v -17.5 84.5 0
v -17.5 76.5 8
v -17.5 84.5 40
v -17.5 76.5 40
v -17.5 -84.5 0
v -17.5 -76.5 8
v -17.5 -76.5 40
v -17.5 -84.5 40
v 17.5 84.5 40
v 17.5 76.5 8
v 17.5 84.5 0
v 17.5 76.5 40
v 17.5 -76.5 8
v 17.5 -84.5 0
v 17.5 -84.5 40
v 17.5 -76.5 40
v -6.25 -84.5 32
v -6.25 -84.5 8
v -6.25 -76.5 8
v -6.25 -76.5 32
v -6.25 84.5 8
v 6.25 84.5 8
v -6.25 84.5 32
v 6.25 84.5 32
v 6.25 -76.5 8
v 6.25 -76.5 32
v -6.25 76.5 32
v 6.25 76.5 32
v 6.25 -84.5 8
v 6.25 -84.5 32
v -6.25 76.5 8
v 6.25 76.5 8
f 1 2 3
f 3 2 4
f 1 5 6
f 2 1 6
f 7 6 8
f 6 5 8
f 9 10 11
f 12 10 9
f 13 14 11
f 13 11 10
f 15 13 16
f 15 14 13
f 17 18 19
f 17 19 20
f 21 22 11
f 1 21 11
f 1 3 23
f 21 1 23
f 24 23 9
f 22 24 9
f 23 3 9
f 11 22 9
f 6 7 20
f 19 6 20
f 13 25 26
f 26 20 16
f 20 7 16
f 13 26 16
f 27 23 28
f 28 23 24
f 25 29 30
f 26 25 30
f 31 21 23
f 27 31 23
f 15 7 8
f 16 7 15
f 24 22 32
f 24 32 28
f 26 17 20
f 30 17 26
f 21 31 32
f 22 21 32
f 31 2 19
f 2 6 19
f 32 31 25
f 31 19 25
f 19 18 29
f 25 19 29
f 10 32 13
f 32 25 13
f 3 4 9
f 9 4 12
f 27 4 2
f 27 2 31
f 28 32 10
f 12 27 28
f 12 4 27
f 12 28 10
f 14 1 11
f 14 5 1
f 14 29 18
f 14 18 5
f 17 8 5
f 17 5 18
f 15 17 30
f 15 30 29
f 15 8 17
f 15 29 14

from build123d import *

# Parameters (mm, degrees)
F0_W      = 35
F0_H      = 76.5
F1_DEPTH  = 8
F1_FACE_W = 35
F1_FACE_H = 8
F2_W      = 35
F2_H      = 40
F3_DEPTH  = 8
F4_W      = 12.5
F4_H      = 24
F5_DEPTH  = 84.501


with BuildPart() as f1:
    # F0 (on Top) → F1 (new body)
    with BuildSketch(Plane.XY):
        with Locations((0, -38.25)):
            Rectangle(F0_W, F0_H)
    extrude(amount=F1_DEPTH)

    # F1_face (on face) + F2 (on face) → F3 (join)
    with BuildSketch(Plane(origin=(0, -76.5, 4), x_dir=(1, 0, 0), z_dir=(0, -1, 0))):
        Rectangle(F1_FACE_W, F1_FACE_H)
    with BuildSketch(Plane.XZ.offset(76.5)):
        with Locations((0, 20)):
            Rectangle(F2_W, F2_H)
    extrude(amount=F3_DEPTH)

    # F4 (on face) → F5 (cut, through all)
    with BuildSketch(Plane.XZ.offset(84.5)):
        with Locations((0, 20)):
            Rectangle(F4_W, F4_H)
    extrude(amount=-F5_DEPTH, mode=Mode.SUBTRACT)

    # F6: F1 across face


with BuildPart() as f1_1:
    add(f1.part)
    add(f1.part.mirror(Plane(origin=(0, 0, 4), x_dir=(-1, 0, 0), z_dir=(0, 1, 0))))


solid = f1_1.part
